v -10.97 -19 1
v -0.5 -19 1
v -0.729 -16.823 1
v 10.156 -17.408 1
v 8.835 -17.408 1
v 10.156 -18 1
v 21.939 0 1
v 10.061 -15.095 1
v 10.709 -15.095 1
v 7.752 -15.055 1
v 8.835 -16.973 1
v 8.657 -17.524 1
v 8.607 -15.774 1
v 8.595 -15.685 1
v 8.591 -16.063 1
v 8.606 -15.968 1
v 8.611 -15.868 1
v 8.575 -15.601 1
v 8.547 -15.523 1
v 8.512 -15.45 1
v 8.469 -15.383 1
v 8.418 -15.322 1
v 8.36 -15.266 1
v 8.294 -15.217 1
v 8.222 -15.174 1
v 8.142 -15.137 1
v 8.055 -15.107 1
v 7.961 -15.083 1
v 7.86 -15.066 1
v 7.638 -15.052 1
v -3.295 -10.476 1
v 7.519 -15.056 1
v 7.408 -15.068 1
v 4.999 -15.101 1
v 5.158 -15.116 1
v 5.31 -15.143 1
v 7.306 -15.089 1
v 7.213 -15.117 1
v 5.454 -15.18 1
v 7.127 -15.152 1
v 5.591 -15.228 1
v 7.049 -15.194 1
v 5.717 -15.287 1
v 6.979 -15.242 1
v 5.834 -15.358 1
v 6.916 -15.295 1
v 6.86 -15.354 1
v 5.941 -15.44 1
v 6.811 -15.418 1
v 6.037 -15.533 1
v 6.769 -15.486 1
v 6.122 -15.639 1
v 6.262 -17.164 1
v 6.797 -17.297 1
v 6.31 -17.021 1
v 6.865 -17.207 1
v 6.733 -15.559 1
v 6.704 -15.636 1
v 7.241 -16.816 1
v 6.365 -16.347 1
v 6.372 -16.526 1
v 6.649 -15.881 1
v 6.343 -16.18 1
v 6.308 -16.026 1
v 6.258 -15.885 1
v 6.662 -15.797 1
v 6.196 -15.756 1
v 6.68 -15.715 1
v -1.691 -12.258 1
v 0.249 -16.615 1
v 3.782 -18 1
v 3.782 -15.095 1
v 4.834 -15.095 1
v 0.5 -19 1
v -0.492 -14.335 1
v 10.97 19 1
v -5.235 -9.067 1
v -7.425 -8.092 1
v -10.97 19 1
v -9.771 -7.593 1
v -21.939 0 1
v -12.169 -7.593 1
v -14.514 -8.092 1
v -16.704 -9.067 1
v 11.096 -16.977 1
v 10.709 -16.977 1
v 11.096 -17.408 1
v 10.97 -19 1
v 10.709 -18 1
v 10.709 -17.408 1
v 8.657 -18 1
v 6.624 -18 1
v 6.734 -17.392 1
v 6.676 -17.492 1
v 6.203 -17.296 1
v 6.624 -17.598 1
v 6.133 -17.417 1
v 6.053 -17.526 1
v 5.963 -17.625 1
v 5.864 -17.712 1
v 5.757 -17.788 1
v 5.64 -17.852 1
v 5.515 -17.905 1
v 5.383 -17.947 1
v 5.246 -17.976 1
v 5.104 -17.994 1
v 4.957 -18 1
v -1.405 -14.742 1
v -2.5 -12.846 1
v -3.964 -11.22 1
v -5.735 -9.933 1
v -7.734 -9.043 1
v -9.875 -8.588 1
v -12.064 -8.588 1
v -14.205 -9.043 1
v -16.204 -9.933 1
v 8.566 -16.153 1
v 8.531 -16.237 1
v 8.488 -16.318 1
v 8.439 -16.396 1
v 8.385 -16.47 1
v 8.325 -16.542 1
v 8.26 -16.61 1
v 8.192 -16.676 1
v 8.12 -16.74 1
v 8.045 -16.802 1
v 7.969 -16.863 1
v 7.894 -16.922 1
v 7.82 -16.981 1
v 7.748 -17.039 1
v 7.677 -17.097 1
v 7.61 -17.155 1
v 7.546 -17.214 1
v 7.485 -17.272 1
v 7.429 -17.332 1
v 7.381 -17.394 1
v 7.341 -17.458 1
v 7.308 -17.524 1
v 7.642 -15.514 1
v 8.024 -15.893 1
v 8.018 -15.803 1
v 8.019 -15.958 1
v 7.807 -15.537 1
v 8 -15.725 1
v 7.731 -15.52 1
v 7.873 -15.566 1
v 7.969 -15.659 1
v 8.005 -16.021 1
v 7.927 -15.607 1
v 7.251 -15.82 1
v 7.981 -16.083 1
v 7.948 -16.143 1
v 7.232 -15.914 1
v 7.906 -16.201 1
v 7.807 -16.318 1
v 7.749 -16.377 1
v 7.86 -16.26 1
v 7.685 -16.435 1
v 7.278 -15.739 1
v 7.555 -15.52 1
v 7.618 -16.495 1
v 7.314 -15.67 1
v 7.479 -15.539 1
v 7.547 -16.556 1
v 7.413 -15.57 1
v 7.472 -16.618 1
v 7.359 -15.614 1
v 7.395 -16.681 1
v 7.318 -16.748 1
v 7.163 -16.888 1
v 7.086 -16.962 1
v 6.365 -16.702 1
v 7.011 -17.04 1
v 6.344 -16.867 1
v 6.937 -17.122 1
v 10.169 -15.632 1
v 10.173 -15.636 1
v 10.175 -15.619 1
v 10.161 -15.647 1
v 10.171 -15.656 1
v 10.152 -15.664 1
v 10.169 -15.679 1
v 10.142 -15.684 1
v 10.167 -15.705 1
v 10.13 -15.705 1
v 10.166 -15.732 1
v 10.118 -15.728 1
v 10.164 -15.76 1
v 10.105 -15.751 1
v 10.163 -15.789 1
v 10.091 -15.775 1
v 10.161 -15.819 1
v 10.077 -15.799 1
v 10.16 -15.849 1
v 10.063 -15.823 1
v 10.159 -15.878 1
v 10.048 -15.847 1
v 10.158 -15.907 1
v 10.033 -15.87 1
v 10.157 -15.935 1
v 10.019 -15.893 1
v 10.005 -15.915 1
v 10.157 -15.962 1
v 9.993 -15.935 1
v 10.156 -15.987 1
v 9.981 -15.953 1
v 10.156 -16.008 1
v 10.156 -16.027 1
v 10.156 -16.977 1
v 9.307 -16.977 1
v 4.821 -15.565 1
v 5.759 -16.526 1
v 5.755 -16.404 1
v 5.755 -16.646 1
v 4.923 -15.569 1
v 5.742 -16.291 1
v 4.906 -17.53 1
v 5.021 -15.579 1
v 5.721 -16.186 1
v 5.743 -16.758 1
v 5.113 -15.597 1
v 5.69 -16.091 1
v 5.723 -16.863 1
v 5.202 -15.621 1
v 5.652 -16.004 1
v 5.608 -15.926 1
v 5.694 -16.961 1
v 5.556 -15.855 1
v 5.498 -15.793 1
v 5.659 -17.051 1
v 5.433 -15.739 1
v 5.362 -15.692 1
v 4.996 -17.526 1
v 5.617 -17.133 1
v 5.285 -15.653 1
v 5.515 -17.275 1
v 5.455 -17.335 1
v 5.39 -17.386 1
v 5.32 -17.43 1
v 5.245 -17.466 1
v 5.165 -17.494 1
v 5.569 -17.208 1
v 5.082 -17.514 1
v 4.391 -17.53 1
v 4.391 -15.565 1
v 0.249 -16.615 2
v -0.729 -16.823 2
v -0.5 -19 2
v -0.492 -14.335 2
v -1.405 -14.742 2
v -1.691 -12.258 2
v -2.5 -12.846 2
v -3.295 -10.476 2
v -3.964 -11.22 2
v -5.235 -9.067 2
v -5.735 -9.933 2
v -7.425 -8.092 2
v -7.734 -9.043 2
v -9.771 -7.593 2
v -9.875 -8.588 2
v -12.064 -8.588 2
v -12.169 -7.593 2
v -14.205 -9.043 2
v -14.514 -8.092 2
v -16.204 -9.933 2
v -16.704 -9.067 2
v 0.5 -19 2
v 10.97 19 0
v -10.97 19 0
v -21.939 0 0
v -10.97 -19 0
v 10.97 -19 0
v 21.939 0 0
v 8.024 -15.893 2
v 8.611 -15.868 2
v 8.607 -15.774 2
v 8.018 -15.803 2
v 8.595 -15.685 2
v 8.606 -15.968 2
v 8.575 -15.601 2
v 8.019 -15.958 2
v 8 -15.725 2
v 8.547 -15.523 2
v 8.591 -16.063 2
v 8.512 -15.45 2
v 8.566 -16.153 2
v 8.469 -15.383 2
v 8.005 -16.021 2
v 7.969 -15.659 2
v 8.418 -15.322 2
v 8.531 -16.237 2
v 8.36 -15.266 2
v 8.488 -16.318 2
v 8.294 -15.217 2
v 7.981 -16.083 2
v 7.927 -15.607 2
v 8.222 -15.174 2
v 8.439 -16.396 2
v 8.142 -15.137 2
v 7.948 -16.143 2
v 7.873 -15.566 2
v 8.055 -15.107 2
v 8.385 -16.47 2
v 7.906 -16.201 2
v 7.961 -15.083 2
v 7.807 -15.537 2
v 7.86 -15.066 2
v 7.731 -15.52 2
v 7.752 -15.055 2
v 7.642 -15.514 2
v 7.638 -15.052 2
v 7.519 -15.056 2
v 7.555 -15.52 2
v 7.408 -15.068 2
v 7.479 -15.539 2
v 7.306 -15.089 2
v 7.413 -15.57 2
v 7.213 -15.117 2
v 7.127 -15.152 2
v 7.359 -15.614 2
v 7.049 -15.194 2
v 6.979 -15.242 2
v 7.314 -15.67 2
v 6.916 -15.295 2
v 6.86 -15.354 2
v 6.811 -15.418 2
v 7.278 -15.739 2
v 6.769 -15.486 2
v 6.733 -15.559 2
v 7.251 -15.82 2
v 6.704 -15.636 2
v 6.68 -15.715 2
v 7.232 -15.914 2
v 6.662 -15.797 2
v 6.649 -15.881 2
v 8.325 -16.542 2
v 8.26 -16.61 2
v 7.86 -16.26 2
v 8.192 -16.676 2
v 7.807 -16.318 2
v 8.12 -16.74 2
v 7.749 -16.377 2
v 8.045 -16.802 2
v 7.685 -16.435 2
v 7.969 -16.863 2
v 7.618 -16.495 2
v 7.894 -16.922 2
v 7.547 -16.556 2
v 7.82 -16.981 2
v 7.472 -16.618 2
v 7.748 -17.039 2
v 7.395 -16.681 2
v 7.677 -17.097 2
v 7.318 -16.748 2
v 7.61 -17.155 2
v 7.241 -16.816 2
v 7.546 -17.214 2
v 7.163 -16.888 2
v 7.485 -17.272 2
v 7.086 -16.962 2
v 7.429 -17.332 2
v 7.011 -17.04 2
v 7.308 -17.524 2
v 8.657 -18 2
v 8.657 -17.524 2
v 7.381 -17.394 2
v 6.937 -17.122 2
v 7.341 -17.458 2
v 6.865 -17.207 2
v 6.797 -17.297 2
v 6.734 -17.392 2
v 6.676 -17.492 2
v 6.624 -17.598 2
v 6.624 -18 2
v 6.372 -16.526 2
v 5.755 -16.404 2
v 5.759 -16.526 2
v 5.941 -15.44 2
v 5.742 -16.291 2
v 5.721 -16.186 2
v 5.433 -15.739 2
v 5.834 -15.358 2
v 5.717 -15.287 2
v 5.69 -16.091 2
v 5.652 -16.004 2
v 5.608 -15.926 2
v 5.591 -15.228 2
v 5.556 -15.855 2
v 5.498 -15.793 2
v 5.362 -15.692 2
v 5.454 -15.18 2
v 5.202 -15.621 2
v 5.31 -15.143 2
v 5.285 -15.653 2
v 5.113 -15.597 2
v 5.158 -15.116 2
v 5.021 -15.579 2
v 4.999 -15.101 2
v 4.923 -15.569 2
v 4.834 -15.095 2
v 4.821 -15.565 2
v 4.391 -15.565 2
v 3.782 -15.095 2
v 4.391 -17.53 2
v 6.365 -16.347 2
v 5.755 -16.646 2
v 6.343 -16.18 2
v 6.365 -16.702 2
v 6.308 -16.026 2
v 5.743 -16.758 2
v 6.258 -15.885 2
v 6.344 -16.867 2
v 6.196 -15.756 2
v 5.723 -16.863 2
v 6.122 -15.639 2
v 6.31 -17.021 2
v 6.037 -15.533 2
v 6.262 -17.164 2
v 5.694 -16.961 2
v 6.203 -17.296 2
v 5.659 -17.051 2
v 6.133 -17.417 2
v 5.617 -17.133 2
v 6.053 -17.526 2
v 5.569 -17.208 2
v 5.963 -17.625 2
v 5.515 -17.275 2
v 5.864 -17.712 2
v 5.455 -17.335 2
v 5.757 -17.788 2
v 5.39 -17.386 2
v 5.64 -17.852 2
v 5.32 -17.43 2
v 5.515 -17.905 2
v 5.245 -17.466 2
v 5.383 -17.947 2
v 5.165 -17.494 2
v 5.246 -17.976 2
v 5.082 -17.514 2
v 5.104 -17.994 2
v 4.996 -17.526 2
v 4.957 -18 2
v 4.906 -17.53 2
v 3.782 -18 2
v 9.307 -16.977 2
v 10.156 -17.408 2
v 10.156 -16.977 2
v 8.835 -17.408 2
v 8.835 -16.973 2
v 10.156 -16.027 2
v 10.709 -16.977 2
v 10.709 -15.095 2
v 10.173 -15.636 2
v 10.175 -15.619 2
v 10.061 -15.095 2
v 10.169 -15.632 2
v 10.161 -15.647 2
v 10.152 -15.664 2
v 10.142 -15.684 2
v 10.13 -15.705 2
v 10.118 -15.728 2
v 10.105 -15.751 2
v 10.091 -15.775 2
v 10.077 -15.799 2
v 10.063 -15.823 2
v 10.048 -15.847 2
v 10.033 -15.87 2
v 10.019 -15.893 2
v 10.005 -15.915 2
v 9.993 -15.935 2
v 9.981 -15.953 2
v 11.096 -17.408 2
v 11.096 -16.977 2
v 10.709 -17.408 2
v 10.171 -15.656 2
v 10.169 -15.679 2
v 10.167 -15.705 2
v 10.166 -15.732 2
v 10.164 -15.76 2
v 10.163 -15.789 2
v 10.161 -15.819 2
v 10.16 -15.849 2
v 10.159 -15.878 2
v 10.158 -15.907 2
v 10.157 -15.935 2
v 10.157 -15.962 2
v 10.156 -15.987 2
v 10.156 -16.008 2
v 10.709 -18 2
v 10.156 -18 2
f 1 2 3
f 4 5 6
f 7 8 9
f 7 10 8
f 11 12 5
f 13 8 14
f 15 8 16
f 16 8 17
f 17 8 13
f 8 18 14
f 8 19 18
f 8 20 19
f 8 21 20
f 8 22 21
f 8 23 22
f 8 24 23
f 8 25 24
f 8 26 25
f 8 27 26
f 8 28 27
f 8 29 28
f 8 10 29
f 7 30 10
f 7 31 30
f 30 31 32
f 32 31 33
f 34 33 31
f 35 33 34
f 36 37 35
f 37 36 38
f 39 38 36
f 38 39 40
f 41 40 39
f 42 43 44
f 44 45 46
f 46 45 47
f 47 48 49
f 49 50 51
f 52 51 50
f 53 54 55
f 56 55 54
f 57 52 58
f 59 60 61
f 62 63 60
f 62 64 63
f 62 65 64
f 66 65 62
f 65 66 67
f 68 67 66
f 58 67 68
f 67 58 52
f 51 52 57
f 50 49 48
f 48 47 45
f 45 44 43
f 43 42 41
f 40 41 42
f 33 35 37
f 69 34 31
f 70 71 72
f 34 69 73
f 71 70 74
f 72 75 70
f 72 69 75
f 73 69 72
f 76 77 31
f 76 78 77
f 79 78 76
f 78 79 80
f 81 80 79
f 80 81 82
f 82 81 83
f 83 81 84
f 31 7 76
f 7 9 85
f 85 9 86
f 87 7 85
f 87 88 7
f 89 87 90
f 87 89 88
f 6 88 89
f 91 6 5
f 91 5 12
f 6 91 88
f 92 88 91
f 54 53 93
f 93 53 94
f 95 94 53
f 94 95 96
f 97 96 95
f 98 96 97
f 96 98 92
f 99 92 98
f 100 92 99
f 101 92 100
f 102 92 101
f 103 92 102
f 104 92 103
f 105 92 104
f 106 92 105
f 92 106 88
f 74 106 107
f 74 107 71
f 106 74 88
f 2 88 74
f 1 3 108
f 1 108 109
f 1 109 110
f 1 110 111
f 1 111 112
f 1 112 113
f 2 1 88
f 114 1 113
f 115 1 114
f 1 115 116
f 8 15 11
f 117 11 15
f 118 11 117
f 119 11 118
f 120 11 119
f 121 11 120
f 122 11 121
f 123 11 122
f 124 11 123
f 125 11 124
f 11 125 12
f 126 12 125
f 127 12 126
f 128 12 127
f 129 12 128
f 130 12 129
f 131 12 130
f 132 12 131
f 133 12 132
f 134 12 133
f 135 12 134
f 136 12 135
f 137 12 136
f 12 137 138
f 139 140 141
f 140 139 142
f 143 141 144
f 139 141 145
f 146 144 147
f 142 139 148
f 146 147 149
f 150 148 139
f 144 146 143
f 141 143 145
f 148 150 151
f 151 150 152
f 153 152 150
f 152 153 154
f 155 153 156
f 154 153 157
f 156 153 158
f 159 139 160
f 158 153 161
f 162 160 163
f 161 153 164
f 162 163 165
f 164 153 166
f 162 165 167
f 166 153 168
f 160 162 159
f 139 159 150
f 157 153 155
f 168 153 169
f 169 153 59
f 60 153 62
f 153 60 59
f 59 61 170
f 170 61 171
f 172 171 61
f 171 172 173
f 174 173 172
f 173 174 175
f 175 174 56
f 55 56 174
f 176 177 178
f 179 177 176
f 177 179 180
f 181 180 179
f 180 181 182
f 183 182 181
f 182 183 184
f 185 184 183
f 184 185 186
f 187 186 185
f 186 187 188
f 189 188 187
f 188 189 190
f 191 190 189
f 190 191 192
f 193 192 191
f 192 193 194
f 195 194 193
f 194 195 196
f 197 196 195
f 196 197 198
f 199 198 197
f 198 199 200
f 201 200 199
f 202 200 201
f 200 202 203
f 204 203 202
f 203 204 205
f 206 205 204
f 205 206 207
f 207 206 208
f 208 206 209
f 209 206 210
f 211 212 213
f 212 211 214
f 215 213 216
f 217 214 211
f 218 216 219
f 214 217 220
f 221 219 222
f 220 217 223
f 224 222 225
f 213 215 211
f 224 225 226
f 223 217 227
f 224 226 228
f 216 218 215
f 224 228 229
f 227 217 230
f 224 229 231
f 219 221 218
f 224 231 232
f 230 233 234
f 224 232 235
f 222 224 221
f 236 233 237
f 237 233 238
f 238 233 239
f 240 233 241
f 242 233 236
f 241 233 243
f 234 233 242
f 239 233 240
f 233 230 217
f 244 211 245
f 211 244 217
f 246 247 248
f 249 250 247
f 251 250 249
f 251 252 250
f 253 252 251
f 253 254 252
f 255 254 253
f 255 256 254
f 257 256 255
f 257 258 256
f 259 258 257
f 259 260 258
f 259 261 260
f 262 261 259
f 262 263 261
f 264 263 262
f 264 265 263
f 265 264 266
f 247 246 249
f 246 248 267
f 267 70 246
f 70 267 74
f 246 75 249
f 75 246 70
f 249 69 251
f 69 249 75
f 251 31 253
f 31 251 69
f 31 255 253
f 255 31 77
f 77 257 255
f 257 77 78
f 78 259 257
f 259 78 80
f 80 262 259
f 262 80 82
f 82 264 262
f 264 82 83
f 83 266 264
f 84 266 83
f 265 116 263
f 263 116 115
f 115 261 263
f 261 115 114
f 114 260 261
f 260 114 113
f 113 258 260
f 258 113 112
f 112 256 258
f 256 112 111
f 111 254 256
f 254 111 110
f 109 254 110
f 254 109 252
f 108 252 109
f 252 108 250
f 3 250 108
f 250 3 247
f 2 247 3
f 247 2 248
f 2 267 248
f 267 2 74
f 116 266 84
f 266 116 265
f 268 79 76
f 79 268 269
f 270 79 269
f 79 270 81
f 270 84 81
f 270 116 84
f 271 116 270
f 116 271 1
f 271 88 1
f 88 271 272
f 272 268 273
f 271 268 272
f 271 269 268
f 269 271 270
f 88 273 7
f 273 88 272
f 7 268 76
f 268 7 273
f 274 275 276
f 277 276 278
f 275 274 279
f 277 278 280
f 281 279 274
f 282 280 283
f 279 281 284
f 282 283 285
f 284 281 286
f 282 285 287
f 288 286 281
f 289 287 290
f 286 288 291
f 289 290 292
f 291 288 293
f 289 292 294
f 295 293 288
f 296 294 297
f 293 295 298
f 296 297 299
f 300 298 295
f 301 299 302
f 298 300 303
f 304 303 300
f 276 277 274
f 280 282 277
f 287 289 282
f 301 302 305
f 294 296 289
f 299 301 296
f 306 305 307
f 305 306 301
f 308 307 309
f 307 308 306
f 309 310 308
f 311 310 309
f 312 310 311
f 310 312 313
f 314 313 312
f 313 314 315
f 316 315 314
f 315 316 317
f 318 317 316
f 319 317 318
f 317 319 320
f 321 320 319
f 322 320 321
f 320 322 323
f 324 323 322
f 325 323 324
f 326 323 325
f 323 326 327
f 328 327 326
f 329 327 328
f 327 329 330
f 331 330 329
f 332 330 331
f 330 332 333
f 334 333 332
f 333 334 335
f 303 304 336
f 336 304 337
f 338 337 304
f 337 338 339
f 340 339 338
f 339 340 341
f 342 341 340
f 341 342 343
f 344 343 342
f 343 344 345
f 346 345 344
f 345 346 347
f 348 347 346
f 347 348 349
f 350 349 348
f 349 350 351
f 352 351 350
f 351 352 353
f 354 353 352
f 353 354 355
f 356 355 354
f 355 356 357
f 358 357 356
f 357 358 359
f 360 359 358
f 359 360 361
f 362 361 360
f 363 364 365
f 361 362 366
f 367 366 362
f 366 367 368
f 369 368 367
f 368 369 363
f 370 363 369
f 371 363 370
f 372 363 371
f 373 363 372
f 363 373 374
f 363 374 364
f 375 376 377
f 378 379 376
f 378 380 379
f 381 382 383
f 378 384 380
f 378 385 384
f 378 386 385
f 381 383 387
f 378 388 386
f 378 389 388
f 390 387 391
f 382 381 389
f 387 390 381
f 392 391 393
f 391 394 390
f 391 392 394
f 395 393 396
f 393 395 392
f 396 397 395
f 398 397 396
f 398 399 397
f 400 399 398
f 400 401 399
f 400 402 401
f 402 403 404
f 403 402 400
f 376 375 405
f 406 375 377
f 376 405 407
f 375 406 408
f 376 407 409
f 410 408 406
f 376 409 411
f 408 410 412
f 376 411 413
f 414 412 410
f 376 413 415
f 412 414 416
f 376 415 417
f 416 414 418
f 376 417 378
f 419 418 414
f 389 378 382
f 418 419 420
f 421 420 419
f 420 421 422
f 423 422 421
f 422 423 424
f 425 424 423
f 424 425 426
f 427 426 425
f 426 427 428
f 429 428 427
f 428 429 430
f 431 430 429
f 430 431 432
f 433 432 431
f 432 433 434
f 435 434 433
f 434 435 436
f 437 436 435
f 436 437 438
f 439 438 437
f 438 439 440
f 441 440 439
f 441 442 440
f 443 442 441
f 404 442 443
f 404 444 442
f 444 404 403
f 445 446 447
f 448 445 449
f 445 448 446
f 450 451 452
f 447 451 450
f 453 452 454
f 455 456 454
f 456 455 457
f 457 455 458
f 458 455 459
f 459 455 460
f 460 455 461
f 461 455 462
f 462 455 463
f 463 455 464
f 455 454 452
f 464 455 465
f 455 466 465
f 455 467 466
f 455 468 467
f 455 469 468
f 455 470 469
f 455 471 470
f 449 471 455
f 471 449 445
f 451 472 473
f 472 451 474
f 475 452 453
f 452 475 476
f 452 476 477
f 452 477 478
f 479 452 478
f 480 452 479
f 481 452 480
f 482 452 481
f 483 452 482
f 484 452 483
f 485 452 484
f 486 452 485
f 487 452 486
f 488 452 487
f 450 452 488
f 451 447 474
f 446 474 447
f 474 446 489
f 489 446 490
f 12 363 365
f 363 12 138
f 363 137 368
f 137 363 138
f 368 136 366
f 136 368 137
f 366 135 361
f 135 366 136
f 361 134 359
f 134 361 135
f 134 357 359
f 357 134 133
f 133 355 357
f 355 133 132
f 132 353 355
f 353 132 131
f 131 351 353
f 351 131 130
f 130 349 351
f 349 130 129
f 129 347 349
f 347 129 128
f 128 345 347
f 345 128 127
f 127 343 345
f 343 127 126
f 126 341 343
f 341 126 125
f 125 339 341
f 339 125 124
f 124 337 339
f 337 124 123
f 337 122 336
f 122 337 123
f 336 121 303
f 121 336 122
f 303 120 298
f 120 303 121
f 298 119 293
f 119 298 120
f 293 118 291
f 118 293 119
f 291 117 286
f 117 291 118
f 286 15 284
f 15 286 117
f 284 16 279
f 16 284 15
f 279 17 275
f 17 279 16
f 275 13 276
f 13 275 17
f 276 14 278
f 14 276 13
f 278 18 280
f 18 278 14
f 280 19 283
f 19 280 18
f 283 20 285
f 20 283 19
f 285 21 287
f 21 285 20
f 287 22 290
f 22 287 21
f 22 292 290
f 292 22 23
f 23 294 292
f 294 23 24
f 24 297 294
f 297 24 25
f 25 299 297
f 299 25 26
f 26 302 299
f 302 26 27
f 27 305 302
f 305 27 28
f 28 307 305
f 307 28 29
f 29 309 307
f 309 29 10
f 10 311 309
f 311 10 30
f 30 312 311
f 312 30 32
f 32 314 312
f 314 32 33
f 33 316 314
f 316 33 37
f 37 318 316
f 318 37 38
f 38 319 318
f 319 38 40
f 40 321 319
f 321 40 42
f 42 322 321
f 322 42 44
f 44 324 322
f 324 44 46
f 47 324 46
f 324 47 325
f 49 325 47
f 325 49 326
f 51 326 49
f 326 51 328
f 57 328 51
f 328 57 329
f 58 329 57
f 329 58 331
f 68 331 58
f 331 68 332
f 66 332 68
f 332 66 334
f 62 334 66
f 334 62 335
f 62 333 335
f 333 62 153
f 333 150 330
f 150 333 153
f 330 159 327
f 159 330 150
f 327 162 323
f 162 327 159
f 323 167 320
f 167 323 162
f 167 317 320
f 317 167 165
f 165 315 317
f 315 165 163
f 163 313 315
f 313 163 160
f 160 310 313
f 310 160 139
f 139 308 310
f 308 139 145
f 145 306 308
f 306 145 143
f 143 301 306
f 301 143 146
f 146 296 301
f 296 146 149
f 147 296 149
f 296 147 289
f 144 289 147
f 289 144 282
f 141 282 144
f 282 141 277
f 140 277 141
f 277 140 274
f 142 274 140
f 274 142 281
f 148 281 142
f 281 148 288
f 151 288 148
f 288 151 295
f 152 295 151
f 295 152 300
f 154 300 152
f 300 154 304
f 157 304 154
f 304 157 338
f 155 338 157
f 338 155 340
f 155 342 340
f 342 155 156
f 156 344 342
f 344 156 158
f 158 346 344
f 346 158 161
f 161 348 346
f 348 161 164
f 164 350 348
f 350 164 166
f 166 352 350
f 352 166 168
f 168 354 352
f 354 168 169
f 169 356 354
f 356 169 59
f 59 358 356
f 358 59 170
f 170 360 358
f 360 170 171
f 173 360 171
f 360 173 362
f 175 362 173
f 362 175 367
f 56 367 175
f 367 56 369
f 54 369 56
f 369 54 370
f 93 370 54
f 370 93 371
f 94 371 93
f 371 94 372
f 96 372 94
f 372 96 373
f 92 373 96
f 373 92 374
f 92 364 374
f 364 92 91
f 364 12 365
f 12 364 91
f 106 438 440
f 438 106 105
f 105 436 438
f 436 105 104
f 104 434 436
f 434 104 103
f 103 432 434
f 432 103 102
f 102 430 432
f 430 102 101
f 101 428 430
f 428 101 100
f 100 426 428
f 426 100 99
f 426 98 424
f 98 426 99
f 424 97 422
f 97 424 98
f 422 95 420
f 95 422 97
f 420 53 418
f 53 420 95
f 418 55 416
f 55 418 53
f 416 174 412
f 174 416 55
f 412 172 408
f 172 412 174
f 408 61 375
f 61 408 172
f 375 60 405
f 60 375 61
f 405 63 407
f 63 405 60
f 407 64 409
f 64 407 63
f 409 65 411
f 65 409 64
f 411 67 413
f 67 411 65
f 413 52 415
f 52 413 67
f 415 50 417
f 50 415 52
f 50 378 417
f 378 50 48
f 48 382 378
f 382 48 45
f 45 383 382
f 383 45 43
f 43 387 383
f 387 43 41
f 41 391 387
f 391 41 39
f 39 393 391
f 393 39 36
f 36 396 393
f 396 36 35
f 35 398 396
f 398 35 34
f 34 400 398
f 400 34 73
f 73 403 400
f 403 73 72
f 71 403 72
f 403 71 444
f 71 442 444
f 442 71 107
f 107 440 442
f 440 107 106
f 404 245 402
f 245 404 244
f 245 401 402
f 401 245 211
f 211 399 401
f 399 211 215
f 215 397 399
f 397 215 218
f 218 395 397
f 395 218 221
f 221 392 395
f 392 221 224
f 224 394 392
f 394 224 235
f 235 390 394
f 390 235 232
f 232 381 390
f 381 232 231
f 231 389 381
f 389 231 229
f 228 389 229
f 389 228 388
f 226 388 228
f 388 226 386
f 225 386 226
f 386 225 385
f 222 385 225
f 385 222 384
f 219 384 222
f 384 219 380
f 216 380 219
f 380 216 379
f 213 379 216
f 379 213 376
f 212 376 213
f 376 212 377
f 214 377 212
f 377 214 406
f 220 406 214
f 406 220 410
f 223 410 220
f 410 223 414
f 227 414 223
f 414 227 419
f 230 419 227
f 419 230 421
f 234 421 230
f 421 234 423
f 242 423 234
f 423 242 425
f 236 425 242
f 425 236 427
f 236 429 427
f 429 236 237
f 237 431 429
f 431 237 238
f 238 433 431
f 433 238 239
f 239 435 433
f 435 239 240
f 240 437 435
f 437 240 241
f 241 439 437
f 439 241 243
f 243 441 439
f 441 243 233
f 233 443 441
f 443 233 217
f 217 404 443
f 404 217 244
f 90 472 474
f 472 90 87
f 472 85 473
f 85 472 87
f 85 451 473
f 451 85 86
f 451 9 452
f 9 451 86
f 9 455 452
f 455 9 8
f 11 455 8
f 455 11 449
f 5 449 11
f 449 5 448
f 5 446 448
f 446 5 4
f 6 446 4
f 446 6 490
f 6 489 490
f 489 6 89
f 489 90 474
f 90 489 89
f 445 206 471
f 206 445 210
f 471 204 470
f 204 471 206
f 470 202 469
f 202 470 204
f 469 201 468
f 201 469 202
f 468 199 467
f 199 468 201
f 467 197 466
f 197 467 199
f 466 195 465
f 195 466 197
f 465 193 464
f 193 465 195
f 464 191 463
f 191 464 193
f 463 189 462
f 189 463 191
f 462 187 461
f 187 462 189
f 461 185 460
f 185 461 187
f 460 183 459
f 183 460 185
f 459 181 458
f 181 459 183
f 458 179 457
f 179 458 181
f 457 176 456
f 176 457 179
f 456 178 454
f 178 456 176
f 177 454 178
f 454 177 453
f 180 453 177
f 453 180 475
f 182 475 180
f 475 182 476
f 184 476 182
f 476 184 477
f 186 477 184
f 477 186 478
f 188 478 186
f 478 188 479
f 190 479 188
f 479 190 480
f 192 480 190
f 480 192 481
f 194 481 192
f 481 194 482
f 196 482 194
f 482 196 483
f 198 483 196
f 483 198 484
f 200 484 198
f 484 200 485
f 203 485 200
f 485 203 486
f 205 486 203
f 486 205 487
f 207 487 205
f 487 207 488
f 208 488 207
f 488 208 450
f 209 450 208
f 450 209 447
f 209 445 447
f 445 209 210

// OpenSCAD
include <../../Scripts/18xx tiles basic functions.scad>
hex("Blue");
sharp_curve(5);
put_tilenr("D24");
